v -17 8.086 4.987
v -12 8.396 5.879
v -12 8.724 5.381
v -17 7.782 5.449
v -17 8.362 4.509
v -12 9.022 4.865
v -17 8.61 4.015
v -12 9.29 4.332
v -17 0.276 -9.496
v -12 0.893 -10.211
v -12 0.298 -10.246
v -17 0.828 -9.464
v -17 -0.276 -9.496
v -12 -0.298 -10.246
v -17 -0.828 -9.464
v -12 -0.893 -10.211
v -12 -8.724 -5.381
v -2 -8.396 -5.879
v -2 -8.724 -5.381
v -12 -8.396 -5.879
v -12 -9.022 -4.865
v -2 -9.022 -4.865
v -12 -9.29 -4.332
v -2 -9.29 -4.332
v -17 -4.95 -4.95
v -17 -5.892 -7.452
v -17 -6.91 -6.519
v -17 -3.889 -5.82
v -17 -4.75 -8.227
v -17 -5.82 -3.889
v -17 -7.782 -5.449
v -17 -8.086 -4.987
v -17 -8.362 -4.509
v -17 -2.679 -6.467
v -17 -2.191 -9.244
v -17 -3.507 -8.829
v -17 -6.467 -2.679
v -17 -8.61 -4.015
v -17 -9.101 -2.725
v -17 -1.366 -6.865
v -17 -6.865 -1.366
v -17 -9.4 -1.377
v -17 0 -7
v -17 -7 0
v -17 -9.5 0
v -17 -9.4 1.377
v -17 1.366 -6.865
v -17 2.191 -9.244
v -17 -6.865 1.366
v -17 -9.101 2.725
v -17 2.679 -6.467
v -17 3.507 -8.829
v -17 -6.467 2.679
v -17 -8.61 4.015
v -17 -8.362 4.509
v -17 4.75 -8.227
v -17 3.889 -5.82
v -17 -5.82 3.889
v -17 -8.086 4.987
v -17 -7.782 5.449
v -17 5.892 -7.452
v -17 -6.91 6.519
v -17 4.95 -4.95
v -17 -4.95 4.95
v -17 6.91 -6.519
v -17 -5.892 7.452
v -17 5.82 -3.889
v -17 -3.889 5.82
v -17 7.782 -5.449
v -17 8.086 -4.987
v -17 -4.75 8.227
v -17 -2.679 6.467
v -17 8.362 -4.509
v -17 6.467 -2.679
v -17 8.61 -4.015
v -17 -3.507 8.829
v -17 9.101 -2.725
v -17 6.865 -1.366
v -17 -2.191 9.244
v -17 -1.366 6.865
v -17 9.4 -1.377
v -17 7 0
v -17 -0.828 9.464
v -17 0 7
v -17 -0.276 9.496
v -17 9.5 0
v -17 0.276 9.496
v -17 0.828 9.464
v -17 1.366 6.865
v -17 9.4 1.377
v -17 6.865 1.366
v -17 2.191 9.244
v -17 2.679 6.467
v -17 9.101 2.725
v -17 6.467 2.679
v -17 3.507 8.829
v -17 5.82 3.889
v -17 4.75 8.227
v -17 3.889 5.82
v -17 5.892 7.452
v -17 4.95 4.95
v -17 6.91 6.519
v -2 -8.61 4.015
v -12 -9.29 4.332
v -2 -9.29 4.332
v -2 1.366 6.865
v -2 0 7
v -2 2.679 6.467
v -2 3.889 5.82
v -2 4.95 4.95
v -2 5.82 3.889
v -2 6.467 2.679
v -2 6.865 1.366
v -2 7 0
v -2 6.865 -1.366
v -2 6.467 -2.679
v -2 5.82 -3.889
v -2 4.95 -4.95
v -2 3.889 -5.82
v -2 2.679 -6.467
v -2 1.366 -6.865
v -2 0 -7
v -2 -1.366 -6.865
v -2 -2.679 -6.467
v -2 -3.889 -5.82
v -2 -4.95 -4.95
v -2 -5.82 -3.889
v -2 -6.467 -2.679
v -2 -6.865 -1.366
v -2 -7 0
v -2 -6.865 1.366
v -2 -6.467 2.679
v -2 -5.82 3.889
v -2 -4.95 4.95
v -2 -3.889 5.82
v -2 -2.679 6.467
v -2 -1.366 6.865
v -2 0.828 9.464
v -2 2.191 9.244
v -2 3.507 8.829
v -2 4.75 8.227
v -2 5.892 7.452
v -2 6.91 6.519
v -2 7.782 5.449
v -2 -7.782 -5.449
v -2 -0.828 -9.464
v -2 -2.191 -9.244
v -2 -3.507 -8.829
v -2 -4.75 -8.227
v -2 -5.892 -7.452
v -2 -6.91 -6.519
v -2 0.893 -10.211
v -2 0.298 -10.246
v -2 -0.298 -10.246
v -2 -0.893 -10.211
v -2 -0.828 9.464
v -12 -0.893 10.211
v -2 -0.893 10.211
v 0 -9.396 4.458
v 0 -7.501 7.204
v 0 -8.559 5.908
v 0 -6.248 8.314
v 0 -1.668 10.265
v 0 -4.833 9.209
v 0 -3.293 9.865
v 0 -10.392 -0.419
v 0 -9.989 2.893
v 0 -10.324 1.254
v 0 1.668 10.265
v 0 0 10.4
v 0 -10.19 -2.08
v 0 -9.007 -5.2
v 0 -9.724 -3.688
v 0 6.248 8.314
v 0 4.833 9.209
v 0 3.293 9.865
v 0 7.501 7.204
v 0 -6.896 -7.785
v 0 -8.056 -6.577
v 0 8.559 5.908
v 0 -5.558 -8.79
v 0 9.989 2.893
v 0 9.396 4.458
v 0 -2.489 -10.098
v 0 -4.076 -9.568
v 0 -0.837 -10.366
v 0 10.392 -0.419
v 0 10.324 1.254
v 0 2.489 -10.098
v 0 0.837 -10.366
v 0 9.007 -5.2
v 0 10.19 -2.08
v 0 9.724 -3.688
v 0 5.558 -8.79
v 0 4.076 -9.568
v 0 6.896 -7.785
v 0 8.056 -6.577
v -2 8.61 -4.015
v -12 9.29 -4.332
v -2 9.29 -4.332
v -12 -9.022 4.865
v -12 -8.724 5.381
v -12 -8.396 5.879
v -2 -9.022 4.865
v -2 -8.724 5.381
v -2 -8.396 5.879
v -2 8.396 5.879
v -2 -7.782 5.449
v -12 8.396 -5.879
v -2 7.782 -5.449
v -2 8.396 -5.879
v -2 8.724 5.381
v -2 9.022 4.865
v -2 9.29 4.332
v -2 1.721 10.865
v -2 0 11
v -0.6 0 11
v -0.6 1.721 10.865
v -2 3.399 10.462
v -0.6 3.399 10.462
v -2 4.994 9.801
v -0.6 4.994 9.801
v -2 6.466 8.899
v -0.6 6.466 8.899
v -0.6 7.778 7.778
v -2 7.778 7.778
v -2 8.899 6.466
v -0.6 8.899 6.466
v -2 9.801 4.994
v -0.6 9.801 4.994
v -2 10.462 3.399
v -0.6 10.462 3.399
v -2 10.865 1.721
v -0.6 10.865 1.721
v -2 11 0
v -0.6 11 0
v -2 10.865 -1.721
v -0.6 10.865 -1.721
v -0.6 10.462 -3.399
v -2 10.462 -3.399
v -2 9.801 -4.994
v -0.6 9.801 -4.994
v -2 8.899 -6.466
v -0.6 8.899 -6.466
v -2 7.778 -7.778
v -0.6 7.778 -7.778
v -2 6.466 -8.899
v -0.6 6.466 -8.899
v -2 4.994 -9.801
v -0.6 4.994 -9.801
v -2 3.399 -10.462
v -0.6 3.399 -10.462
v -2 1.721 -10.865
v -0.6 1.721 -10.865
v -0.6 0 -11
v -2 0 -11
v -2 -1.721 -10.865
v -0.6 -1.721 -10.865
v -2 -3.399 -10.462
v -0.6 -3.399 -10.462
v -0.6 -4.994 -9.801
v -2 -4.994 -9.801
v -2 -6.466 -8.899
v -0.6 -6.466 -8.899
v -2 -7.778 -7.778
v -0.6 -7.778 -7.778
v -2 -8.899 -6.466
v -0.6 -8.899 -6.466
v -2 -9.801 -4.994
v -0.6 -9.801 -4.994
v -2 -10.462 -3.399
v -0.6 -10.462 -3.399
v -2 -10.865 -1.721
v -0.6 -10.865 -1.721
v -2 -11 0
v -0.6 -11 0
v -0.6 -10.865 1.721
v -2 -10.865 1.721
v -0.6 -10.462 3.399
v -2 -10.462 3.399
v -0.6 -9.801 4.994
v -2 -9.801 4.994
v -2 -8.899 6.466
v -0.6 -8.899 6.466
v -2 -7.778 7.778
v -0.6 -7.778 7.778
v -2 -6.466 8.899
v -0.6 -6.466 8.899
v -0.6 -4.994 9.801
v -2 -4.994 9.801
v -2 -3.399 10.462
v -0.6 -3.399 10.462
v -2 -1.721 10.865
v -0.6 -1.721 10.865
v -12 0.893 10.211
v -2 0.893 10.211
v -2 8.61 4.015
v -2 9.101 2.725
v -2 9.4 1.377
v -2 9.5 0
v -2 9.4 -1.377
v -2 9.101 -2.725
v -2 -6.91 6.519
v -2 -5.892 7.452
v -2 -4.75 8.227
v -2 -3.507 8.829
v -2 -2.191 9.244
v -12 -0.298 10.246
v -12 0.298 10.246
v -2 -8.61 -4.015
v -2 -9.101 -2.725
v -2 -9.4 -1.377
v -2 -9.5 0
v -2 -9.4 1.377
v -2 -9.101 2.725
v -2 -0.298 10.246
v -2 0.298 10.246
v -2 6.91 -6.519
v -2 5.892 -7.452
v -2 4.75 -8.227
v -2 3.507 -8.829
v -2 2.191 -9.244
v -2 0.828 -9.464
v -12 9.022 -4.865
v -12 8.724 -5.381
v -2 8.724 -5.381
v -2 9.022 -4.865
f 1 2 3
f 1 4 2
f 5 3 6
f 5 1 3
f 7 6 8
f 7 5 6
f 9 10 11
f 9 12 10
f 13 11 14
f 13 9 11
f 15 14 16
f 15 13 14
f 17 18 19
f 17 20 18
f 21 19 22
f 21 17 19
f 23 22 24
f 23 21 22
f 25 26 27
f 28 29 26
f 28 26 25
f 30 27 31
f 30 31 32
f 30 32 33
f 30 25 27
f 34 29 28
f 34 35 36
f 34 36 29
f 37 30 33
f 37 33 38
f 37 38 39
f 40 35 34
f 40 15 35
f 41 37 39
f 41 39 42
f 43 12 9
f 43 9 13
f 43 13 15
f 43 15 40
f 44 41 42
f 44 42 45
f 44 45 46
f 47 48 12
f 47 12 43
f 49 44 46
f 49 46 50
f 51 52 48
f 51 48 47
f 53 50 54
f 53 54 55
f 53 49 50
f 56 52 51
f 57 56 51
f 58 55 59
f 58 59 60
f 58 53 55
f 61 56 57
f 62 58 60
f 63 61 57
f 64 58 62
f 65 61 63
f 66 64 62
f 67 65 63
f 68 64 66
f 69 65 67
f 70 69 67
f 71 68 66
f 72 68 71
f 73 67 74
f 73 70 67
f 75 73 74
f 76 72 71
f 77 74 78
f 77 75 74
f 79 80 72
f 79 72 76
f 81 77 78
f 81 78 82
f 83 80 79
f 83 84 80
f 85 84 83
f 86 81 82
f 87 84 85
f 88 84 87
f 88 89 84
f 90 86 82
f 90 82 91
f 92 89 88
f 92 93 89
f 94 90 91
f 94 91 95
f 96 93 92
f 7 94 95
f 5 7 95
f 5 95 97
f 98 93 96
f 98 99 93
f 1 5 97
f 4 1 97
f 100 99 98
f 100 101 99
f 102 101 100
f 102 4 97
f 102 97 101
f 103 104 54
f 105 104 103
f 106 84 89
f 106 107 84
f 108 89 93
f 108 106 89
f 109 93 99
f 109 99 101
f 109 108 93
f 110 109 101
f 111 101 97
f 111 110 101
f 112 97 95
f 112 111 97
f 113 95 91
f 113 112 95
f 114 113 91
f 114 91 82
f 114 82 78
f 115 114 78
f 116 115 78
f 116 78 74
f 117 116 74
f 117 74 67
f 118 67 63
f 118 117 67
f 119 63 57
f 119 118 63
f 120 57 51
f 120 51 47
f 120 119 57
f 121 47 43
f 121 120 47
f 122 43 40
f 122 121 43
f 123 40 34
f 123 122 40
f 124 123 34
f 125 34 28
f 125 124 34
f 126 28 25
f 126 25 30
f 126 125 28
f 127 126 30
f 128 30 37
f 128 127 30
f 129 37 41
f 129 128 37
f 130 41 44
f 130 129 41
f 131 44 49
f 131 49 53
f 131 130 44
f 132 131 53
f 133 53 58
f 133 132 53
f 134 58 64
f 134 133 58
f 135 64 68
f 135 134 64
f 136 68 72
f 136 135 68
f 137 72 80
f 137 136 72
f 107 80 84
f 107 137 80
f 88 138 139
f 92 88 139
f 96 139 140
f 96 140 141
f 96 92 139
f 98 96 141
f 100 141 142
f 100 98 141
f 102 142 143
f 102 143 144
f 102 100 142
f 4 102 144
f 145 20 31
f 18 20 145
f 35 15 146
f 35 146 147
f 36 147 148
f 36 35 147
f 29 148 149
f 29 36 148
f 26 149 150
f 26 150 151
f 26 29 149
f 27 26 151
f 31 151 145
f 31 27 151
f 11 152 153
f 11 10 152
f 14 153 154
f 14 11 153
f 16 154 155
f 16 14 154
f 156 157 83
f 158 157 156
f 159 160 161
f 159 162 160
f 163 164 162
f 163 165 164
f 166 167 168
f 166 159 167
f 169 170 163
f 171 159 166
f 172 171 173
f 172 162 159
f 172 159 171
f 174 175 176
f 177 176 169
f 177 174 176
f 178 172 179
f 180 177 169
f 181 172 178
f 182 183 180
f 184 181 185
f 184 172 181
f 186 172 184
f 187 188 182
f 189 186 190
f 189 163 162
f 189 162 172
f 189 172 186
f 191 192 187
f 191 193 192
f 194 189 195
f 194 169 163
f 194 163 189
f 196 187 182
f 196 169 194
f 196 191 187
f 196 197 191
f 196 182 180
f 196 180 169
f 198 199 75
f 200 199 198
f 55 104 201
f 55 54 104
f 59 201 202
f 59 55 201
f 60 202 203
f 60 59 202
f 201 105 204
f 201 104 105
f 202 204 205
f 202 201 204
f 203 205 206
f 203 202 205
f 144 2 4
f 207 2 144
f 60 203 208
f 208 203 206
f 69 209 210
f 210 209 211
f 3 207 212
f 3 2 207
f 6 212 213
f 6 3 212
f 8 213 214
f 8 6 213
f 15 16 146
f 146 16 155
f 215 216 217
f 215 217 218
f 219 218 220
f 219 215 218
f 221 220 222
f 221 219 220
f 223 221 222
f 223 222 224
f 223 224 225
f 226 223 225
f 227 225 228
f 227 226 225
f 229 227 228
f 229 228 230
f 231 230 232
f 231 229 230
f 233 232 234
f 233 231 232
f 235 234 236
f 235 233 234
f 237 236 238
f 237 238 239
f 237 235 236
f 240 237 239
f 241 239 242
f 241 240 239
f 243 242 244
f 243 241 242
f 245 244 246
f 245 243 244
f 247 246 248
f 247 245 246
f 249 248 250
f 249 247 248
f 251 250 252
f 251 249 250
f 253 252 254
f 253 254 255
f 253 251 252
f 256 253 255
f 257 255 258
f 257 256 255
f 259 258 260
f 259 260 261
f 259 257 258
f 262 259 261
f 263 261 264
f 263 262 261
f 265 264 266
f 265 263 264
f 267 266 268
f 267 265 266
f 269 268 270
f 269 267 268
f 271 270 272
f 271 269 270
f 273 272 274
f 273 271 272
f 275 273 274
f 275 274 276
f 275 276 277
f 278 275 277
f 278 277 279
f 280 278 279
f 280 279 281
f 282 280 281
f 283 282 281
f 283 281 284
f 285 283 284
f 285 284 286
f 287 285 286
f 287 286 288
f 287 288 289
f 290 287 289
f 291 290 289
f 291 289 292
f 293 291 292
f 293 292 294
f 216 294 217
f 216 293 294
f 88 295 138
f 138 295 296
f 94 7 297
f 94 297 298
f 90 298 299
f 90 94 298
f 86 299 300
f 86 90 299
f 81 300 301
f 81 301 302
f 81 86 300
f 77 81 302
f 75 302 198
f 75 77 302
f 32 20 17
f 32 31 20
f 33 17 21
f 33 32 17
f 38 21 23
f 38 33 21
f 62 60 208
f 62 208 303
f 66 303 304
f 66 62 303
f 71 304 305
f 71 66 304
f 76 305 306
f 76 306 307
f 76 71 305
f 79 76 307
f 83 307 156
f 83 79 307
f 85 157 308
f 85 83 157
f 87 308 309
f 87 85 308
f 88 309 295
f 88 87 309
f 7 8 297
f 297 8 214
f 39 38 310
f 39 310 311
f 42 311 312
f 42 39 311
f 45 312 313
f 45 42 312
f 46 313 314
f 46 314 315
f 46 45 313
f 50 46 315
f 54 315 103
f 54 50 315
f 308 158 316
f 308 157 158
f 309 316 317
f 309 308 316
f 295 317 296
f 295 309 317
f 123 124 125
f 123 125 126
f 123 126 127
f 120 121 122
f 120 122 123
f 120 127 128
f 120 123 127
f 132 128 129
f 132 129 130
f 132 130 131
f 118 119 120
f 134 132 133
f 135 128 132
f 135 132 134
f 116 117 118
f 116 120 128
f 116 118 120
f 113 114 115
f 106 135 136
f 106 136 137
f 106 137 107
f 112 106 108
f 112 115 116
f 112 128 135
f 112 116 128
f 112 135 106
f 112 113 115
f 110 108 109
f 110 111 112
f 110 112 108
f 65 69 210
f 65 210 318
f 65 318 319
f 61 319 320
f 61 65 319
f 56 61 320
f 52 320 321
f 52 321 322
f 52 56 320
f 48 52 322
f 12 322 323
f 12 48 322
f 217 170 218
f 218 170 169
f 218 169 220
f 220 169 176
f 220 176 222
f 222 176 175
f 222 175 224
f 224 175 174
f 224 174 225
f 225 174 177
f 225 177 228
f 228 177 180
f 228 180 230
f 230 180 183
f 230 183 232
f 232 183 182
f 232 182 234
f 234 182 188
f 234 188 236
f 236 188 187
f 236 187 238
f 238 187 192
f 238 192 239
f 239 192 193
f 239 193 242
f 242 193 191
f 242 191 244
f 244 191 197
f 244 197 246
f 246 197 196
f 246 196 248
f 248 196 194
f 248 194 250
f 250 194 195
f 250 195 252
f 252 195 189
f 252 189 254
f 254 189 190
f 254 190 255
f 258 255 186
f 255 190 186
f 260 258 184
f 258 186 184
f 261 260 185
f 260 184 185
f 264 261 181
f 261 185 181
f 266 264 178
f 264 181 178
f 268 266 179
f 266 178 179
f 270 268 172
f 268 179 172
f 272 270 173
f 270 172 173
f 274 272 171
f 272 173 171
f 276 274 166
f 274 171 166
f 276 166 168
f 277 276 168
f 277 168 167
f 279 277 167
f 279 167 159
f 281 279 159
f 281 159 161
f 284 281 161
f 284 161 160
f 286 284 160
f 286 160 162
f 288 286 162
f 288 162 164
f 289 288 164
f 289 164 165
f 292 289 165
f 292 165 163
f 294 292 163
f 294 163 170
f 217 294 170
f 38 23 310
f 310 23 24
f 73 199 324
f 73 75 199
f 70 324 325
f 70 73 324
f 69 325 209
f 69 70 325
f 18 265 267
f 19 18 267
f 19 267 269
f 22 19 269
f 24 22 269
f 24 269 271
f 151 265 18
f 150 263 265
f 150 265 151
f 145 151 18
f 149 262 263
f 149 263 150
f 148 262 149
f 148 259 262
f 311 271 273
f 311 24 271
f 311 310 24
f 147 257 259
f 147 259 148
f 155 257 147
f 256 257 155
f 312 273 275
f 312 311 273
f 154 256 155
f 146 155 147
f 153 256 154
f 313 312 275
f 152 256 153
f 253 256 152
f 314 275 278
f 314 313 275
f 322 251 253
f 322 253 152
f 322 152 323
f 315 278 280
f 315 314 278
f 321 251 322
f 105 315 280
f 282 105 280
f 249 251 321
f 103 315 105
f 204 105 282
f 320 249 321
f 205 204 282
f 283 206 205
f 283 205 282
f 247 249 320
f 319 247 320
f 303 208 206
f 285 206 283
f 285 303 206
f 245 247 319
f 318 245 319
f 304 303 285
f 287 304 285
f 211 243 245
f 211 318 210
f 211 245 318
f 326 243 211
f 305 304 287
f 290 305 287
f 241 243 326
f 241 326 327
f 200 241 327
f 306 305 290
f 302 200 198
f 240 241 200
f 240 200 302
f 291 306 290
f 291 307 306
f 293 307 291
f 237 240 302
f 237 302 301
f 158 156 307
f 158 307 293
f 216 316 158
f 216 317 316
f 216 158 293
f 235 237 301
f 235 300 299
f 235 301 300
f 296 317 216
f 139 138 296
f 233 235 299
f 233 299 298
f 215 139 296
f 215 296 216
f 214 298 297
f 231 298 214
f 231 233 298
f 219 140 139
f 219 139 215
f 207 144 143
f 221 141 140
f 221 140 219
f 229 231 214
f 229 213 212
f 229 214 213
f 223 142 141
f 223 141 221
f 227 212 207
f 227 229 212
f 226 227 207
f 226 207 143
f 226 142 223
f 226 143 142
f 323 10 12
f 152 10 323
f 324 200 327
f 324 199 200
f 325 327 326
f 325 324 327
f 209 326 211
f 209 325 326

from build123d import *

# Parameters (mm, degrees)
F2_ANGLE_BACK   = 5
F2_ANGLE        = 10
F2_COPIES_COUNT = 6
F3_SIZE         = 0.6


# Not quite as in the source:
# - a pattern or mirror of a feature is missing from the dataset's text; its kind, count and spacing are read off the source's solid


with BuildPart() as f1:
    # F0 (on Front) → F1 (revolve)
    with BuildSketch(Plane.XZ):
        Polygon((-2, 0), (0, 0), (0, 11), (-2, 11), (-2, 10.25), (-2, 9.5), (-17, 9.5), (-17, 7), (-2, 7), align=None)
    revolve(axis=Axis((-8.5, 0, 0), (-1, 0, 0)))

    # F0 (on Front) → F2 (revolve)
    with BuildSketch(Plane.XZ, mode=Mode.PRIVATE) as f2_sk:
        Polygon((-2, 9.5), (-2, 10.25), (-12, 10.25), (-17, 9.5), align=None)
    f2 = revolve(f2_sk.sketch.rotate(Axis((-8.5, 0, 0), (-1, 0, 0)), -F2_ANGLE_BACK), axis=Axis((-8.5, 0, 0), (-1, 0, 0)), revolution_arc=F2_ANGLE)

    # F2_copies: F2 ×6 about axis
    f2_copies_axis = Axis((0, 0, 0), (1, 0, 0))
    for i in range(1, F2_COPIES_COUNT):
        add(f2.rotate(f2_copies_axis, i * 360 / F2_COPIES_COUNT))

    # F3
    f3_edges = [f1.edges().sort_by_distance(p)[0] for p in [
        (0, 0, -11),
    ]]
    chamfer(f3_edges, length=F3_SIZE)


solid = f1.part
